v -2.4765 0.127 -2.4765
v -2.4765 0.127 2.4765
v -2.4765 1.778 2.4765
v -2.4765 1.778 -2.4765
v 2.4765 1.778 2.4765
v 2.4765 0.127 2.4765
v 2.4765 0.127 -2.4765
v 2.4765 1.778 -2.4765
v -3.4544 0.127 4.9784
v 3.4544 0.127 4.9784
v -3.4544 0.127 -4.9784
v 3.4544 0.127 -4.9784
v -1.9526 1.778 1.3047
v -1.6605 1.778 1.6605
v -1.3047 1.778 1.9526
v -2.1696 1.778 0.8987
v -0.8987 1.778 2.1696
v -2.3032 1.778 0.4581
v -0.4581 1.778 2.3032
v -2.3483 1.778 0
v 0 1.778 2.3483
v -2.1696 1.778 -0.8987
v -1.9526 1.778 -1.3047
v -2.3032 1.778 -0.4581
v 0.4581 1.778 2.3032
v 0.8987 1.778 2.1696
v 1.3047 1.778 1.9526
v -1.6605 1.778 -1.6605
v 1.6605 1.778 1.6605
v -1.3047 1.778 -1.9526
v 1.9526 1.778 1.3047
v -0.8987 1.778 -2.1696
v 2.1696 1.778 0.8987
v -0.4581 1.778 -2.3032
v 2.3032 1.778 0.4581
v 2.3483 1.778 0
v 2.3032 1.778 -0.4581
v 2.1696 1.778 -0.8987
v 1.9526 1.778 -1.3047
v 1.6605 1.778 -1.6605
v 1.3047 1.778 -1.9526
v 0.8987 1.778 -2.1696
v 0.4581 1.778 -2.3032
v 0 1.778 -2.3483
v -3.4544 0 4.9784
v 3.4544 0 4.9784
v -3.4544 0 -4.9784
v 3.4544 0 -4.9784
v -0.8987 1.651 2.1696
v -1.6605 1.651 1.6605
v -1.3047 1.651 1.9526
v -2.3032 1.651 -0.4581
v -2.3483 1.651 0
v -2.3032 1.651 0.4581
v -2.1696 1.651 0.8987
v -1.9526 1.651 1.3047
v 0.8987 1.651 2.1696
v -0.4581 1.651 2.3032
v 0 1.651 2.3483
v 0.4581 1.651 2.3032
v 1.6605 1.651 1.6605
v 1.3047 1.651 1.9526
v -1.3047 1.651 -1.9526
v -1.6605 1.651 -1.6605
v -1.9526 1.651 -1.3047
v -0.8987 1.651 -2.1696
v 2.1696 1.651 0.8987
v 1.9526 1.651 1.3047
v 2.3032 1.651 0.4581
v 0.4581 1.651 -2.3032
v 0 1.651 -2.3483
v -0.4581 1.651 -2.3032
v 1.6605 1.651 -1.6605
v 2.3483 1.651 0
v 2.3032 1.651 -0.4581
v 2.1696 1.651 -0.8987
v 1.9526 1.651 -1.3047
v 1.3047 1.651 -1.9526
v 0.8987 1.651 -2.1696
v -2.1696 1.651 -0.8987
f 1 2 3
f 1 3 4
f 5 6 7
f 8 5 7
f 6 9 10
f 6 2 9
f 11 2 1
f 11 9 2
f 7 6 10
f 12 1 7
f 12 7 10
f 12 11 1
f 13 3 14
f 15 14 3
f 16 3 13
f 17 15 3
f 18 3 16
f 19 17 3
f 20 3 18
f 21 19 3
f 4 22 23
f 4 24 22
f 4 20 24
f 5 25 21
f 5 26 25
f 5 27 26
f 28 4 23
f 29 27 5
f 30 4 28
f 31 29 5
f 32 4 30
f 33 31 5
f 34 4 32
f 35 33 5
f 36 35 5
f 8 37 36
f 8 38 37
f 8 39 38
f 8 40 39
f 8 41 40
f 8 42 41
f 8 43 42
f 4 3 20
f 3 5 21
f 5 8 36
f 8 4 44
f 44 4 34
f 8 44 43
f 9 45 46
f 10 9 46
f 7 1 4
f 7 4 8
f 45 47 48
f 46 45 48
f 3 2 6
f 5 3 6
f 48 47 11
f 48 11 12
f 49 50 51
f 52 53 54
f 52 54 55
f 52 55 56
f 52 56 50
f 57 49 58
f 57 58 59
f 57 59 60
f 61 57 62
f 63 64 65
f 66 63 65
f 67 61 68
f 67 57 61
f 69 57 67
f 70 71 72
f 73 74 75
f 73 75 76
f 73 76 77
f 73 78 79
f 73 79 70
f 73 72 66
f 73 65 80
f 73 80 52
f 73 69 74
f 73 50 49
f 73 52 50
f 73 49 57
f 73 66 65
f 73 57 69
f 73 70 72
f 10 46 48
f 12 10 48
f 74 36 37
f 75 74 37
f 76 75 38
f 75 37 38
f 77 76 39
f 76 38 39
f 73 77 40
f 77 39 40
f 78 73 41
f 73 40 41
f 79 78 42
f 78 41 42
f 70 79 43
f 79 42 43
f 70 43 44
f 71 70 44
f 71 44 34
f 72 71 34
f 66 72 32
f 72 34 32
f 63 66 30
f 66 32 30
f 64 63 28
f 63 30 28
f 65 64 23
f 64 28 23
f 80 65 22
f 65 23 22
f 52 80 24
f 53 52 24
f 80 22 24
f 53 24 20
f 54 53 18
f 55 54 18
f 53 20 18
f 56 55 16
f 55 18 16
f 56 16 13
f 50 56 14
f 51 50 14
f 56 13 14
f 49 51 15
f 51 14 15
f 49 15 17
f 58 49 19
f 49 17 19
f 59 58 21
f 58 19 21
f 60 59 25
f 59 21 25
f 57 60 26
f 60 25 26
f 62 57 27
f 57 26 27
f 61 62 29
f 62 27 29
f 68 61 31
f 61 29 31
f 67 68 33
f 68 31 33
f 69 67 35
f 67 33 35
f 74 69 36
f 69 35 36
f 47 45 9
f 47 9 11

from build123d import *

# Parameters (mm, degrees)
SKETCH1_W           = 6.9088
SKETCH1_H           = 9.9568
BOSS_EXTRUDE1_DEPTH = 0.127
SKETCH3_W           = 4.953
SKETCH3_H           = 4.953
BOSS_EXTRUDE3_DEPTH = 1.651
SKETCH5_R           = 2.348345572
CUT_EXTRUDE1_DEPTH  = 0.127


with BuildPart() as part:
    # Sketch1 → Boss-Extrude1 (new body)
    with BuildSketch(Plane(origin=(0, 0, 0), x_dir=(1, 0, 0), z_dir=(0, 1, 0))):
        Rectangle(SKETCH1_W, SKETCH1_H)
    extrude(amount=BOSS_EXTRUDE1_DEPTH)

    # Sketch3 → Boss-Extrude3 (add)
    with BuildSketch(Plane(origin=(0, 0.127, 0), x_dir=(1, 0, 0), z_dir=(0, 1, 0))):
        Rectangle(SKETCH3_W, SKETCH3_H)
    extrude(amount=BOSS_EXTRUDE3_DEPTH)

    # Sketch5 → Cut-Extrude1 (cut)
    with BuildSketch(Plane(origin=(0, 1.778, 0), x_dir=(1, 0, 0), z_dir=(0, 1, 0))):
        Circle(SKETCH5_R)
    extrude(amount=-CUT_EXTRUDE1_DEPTH, mode=Mode.SUBTRACT)


solid = part.part
